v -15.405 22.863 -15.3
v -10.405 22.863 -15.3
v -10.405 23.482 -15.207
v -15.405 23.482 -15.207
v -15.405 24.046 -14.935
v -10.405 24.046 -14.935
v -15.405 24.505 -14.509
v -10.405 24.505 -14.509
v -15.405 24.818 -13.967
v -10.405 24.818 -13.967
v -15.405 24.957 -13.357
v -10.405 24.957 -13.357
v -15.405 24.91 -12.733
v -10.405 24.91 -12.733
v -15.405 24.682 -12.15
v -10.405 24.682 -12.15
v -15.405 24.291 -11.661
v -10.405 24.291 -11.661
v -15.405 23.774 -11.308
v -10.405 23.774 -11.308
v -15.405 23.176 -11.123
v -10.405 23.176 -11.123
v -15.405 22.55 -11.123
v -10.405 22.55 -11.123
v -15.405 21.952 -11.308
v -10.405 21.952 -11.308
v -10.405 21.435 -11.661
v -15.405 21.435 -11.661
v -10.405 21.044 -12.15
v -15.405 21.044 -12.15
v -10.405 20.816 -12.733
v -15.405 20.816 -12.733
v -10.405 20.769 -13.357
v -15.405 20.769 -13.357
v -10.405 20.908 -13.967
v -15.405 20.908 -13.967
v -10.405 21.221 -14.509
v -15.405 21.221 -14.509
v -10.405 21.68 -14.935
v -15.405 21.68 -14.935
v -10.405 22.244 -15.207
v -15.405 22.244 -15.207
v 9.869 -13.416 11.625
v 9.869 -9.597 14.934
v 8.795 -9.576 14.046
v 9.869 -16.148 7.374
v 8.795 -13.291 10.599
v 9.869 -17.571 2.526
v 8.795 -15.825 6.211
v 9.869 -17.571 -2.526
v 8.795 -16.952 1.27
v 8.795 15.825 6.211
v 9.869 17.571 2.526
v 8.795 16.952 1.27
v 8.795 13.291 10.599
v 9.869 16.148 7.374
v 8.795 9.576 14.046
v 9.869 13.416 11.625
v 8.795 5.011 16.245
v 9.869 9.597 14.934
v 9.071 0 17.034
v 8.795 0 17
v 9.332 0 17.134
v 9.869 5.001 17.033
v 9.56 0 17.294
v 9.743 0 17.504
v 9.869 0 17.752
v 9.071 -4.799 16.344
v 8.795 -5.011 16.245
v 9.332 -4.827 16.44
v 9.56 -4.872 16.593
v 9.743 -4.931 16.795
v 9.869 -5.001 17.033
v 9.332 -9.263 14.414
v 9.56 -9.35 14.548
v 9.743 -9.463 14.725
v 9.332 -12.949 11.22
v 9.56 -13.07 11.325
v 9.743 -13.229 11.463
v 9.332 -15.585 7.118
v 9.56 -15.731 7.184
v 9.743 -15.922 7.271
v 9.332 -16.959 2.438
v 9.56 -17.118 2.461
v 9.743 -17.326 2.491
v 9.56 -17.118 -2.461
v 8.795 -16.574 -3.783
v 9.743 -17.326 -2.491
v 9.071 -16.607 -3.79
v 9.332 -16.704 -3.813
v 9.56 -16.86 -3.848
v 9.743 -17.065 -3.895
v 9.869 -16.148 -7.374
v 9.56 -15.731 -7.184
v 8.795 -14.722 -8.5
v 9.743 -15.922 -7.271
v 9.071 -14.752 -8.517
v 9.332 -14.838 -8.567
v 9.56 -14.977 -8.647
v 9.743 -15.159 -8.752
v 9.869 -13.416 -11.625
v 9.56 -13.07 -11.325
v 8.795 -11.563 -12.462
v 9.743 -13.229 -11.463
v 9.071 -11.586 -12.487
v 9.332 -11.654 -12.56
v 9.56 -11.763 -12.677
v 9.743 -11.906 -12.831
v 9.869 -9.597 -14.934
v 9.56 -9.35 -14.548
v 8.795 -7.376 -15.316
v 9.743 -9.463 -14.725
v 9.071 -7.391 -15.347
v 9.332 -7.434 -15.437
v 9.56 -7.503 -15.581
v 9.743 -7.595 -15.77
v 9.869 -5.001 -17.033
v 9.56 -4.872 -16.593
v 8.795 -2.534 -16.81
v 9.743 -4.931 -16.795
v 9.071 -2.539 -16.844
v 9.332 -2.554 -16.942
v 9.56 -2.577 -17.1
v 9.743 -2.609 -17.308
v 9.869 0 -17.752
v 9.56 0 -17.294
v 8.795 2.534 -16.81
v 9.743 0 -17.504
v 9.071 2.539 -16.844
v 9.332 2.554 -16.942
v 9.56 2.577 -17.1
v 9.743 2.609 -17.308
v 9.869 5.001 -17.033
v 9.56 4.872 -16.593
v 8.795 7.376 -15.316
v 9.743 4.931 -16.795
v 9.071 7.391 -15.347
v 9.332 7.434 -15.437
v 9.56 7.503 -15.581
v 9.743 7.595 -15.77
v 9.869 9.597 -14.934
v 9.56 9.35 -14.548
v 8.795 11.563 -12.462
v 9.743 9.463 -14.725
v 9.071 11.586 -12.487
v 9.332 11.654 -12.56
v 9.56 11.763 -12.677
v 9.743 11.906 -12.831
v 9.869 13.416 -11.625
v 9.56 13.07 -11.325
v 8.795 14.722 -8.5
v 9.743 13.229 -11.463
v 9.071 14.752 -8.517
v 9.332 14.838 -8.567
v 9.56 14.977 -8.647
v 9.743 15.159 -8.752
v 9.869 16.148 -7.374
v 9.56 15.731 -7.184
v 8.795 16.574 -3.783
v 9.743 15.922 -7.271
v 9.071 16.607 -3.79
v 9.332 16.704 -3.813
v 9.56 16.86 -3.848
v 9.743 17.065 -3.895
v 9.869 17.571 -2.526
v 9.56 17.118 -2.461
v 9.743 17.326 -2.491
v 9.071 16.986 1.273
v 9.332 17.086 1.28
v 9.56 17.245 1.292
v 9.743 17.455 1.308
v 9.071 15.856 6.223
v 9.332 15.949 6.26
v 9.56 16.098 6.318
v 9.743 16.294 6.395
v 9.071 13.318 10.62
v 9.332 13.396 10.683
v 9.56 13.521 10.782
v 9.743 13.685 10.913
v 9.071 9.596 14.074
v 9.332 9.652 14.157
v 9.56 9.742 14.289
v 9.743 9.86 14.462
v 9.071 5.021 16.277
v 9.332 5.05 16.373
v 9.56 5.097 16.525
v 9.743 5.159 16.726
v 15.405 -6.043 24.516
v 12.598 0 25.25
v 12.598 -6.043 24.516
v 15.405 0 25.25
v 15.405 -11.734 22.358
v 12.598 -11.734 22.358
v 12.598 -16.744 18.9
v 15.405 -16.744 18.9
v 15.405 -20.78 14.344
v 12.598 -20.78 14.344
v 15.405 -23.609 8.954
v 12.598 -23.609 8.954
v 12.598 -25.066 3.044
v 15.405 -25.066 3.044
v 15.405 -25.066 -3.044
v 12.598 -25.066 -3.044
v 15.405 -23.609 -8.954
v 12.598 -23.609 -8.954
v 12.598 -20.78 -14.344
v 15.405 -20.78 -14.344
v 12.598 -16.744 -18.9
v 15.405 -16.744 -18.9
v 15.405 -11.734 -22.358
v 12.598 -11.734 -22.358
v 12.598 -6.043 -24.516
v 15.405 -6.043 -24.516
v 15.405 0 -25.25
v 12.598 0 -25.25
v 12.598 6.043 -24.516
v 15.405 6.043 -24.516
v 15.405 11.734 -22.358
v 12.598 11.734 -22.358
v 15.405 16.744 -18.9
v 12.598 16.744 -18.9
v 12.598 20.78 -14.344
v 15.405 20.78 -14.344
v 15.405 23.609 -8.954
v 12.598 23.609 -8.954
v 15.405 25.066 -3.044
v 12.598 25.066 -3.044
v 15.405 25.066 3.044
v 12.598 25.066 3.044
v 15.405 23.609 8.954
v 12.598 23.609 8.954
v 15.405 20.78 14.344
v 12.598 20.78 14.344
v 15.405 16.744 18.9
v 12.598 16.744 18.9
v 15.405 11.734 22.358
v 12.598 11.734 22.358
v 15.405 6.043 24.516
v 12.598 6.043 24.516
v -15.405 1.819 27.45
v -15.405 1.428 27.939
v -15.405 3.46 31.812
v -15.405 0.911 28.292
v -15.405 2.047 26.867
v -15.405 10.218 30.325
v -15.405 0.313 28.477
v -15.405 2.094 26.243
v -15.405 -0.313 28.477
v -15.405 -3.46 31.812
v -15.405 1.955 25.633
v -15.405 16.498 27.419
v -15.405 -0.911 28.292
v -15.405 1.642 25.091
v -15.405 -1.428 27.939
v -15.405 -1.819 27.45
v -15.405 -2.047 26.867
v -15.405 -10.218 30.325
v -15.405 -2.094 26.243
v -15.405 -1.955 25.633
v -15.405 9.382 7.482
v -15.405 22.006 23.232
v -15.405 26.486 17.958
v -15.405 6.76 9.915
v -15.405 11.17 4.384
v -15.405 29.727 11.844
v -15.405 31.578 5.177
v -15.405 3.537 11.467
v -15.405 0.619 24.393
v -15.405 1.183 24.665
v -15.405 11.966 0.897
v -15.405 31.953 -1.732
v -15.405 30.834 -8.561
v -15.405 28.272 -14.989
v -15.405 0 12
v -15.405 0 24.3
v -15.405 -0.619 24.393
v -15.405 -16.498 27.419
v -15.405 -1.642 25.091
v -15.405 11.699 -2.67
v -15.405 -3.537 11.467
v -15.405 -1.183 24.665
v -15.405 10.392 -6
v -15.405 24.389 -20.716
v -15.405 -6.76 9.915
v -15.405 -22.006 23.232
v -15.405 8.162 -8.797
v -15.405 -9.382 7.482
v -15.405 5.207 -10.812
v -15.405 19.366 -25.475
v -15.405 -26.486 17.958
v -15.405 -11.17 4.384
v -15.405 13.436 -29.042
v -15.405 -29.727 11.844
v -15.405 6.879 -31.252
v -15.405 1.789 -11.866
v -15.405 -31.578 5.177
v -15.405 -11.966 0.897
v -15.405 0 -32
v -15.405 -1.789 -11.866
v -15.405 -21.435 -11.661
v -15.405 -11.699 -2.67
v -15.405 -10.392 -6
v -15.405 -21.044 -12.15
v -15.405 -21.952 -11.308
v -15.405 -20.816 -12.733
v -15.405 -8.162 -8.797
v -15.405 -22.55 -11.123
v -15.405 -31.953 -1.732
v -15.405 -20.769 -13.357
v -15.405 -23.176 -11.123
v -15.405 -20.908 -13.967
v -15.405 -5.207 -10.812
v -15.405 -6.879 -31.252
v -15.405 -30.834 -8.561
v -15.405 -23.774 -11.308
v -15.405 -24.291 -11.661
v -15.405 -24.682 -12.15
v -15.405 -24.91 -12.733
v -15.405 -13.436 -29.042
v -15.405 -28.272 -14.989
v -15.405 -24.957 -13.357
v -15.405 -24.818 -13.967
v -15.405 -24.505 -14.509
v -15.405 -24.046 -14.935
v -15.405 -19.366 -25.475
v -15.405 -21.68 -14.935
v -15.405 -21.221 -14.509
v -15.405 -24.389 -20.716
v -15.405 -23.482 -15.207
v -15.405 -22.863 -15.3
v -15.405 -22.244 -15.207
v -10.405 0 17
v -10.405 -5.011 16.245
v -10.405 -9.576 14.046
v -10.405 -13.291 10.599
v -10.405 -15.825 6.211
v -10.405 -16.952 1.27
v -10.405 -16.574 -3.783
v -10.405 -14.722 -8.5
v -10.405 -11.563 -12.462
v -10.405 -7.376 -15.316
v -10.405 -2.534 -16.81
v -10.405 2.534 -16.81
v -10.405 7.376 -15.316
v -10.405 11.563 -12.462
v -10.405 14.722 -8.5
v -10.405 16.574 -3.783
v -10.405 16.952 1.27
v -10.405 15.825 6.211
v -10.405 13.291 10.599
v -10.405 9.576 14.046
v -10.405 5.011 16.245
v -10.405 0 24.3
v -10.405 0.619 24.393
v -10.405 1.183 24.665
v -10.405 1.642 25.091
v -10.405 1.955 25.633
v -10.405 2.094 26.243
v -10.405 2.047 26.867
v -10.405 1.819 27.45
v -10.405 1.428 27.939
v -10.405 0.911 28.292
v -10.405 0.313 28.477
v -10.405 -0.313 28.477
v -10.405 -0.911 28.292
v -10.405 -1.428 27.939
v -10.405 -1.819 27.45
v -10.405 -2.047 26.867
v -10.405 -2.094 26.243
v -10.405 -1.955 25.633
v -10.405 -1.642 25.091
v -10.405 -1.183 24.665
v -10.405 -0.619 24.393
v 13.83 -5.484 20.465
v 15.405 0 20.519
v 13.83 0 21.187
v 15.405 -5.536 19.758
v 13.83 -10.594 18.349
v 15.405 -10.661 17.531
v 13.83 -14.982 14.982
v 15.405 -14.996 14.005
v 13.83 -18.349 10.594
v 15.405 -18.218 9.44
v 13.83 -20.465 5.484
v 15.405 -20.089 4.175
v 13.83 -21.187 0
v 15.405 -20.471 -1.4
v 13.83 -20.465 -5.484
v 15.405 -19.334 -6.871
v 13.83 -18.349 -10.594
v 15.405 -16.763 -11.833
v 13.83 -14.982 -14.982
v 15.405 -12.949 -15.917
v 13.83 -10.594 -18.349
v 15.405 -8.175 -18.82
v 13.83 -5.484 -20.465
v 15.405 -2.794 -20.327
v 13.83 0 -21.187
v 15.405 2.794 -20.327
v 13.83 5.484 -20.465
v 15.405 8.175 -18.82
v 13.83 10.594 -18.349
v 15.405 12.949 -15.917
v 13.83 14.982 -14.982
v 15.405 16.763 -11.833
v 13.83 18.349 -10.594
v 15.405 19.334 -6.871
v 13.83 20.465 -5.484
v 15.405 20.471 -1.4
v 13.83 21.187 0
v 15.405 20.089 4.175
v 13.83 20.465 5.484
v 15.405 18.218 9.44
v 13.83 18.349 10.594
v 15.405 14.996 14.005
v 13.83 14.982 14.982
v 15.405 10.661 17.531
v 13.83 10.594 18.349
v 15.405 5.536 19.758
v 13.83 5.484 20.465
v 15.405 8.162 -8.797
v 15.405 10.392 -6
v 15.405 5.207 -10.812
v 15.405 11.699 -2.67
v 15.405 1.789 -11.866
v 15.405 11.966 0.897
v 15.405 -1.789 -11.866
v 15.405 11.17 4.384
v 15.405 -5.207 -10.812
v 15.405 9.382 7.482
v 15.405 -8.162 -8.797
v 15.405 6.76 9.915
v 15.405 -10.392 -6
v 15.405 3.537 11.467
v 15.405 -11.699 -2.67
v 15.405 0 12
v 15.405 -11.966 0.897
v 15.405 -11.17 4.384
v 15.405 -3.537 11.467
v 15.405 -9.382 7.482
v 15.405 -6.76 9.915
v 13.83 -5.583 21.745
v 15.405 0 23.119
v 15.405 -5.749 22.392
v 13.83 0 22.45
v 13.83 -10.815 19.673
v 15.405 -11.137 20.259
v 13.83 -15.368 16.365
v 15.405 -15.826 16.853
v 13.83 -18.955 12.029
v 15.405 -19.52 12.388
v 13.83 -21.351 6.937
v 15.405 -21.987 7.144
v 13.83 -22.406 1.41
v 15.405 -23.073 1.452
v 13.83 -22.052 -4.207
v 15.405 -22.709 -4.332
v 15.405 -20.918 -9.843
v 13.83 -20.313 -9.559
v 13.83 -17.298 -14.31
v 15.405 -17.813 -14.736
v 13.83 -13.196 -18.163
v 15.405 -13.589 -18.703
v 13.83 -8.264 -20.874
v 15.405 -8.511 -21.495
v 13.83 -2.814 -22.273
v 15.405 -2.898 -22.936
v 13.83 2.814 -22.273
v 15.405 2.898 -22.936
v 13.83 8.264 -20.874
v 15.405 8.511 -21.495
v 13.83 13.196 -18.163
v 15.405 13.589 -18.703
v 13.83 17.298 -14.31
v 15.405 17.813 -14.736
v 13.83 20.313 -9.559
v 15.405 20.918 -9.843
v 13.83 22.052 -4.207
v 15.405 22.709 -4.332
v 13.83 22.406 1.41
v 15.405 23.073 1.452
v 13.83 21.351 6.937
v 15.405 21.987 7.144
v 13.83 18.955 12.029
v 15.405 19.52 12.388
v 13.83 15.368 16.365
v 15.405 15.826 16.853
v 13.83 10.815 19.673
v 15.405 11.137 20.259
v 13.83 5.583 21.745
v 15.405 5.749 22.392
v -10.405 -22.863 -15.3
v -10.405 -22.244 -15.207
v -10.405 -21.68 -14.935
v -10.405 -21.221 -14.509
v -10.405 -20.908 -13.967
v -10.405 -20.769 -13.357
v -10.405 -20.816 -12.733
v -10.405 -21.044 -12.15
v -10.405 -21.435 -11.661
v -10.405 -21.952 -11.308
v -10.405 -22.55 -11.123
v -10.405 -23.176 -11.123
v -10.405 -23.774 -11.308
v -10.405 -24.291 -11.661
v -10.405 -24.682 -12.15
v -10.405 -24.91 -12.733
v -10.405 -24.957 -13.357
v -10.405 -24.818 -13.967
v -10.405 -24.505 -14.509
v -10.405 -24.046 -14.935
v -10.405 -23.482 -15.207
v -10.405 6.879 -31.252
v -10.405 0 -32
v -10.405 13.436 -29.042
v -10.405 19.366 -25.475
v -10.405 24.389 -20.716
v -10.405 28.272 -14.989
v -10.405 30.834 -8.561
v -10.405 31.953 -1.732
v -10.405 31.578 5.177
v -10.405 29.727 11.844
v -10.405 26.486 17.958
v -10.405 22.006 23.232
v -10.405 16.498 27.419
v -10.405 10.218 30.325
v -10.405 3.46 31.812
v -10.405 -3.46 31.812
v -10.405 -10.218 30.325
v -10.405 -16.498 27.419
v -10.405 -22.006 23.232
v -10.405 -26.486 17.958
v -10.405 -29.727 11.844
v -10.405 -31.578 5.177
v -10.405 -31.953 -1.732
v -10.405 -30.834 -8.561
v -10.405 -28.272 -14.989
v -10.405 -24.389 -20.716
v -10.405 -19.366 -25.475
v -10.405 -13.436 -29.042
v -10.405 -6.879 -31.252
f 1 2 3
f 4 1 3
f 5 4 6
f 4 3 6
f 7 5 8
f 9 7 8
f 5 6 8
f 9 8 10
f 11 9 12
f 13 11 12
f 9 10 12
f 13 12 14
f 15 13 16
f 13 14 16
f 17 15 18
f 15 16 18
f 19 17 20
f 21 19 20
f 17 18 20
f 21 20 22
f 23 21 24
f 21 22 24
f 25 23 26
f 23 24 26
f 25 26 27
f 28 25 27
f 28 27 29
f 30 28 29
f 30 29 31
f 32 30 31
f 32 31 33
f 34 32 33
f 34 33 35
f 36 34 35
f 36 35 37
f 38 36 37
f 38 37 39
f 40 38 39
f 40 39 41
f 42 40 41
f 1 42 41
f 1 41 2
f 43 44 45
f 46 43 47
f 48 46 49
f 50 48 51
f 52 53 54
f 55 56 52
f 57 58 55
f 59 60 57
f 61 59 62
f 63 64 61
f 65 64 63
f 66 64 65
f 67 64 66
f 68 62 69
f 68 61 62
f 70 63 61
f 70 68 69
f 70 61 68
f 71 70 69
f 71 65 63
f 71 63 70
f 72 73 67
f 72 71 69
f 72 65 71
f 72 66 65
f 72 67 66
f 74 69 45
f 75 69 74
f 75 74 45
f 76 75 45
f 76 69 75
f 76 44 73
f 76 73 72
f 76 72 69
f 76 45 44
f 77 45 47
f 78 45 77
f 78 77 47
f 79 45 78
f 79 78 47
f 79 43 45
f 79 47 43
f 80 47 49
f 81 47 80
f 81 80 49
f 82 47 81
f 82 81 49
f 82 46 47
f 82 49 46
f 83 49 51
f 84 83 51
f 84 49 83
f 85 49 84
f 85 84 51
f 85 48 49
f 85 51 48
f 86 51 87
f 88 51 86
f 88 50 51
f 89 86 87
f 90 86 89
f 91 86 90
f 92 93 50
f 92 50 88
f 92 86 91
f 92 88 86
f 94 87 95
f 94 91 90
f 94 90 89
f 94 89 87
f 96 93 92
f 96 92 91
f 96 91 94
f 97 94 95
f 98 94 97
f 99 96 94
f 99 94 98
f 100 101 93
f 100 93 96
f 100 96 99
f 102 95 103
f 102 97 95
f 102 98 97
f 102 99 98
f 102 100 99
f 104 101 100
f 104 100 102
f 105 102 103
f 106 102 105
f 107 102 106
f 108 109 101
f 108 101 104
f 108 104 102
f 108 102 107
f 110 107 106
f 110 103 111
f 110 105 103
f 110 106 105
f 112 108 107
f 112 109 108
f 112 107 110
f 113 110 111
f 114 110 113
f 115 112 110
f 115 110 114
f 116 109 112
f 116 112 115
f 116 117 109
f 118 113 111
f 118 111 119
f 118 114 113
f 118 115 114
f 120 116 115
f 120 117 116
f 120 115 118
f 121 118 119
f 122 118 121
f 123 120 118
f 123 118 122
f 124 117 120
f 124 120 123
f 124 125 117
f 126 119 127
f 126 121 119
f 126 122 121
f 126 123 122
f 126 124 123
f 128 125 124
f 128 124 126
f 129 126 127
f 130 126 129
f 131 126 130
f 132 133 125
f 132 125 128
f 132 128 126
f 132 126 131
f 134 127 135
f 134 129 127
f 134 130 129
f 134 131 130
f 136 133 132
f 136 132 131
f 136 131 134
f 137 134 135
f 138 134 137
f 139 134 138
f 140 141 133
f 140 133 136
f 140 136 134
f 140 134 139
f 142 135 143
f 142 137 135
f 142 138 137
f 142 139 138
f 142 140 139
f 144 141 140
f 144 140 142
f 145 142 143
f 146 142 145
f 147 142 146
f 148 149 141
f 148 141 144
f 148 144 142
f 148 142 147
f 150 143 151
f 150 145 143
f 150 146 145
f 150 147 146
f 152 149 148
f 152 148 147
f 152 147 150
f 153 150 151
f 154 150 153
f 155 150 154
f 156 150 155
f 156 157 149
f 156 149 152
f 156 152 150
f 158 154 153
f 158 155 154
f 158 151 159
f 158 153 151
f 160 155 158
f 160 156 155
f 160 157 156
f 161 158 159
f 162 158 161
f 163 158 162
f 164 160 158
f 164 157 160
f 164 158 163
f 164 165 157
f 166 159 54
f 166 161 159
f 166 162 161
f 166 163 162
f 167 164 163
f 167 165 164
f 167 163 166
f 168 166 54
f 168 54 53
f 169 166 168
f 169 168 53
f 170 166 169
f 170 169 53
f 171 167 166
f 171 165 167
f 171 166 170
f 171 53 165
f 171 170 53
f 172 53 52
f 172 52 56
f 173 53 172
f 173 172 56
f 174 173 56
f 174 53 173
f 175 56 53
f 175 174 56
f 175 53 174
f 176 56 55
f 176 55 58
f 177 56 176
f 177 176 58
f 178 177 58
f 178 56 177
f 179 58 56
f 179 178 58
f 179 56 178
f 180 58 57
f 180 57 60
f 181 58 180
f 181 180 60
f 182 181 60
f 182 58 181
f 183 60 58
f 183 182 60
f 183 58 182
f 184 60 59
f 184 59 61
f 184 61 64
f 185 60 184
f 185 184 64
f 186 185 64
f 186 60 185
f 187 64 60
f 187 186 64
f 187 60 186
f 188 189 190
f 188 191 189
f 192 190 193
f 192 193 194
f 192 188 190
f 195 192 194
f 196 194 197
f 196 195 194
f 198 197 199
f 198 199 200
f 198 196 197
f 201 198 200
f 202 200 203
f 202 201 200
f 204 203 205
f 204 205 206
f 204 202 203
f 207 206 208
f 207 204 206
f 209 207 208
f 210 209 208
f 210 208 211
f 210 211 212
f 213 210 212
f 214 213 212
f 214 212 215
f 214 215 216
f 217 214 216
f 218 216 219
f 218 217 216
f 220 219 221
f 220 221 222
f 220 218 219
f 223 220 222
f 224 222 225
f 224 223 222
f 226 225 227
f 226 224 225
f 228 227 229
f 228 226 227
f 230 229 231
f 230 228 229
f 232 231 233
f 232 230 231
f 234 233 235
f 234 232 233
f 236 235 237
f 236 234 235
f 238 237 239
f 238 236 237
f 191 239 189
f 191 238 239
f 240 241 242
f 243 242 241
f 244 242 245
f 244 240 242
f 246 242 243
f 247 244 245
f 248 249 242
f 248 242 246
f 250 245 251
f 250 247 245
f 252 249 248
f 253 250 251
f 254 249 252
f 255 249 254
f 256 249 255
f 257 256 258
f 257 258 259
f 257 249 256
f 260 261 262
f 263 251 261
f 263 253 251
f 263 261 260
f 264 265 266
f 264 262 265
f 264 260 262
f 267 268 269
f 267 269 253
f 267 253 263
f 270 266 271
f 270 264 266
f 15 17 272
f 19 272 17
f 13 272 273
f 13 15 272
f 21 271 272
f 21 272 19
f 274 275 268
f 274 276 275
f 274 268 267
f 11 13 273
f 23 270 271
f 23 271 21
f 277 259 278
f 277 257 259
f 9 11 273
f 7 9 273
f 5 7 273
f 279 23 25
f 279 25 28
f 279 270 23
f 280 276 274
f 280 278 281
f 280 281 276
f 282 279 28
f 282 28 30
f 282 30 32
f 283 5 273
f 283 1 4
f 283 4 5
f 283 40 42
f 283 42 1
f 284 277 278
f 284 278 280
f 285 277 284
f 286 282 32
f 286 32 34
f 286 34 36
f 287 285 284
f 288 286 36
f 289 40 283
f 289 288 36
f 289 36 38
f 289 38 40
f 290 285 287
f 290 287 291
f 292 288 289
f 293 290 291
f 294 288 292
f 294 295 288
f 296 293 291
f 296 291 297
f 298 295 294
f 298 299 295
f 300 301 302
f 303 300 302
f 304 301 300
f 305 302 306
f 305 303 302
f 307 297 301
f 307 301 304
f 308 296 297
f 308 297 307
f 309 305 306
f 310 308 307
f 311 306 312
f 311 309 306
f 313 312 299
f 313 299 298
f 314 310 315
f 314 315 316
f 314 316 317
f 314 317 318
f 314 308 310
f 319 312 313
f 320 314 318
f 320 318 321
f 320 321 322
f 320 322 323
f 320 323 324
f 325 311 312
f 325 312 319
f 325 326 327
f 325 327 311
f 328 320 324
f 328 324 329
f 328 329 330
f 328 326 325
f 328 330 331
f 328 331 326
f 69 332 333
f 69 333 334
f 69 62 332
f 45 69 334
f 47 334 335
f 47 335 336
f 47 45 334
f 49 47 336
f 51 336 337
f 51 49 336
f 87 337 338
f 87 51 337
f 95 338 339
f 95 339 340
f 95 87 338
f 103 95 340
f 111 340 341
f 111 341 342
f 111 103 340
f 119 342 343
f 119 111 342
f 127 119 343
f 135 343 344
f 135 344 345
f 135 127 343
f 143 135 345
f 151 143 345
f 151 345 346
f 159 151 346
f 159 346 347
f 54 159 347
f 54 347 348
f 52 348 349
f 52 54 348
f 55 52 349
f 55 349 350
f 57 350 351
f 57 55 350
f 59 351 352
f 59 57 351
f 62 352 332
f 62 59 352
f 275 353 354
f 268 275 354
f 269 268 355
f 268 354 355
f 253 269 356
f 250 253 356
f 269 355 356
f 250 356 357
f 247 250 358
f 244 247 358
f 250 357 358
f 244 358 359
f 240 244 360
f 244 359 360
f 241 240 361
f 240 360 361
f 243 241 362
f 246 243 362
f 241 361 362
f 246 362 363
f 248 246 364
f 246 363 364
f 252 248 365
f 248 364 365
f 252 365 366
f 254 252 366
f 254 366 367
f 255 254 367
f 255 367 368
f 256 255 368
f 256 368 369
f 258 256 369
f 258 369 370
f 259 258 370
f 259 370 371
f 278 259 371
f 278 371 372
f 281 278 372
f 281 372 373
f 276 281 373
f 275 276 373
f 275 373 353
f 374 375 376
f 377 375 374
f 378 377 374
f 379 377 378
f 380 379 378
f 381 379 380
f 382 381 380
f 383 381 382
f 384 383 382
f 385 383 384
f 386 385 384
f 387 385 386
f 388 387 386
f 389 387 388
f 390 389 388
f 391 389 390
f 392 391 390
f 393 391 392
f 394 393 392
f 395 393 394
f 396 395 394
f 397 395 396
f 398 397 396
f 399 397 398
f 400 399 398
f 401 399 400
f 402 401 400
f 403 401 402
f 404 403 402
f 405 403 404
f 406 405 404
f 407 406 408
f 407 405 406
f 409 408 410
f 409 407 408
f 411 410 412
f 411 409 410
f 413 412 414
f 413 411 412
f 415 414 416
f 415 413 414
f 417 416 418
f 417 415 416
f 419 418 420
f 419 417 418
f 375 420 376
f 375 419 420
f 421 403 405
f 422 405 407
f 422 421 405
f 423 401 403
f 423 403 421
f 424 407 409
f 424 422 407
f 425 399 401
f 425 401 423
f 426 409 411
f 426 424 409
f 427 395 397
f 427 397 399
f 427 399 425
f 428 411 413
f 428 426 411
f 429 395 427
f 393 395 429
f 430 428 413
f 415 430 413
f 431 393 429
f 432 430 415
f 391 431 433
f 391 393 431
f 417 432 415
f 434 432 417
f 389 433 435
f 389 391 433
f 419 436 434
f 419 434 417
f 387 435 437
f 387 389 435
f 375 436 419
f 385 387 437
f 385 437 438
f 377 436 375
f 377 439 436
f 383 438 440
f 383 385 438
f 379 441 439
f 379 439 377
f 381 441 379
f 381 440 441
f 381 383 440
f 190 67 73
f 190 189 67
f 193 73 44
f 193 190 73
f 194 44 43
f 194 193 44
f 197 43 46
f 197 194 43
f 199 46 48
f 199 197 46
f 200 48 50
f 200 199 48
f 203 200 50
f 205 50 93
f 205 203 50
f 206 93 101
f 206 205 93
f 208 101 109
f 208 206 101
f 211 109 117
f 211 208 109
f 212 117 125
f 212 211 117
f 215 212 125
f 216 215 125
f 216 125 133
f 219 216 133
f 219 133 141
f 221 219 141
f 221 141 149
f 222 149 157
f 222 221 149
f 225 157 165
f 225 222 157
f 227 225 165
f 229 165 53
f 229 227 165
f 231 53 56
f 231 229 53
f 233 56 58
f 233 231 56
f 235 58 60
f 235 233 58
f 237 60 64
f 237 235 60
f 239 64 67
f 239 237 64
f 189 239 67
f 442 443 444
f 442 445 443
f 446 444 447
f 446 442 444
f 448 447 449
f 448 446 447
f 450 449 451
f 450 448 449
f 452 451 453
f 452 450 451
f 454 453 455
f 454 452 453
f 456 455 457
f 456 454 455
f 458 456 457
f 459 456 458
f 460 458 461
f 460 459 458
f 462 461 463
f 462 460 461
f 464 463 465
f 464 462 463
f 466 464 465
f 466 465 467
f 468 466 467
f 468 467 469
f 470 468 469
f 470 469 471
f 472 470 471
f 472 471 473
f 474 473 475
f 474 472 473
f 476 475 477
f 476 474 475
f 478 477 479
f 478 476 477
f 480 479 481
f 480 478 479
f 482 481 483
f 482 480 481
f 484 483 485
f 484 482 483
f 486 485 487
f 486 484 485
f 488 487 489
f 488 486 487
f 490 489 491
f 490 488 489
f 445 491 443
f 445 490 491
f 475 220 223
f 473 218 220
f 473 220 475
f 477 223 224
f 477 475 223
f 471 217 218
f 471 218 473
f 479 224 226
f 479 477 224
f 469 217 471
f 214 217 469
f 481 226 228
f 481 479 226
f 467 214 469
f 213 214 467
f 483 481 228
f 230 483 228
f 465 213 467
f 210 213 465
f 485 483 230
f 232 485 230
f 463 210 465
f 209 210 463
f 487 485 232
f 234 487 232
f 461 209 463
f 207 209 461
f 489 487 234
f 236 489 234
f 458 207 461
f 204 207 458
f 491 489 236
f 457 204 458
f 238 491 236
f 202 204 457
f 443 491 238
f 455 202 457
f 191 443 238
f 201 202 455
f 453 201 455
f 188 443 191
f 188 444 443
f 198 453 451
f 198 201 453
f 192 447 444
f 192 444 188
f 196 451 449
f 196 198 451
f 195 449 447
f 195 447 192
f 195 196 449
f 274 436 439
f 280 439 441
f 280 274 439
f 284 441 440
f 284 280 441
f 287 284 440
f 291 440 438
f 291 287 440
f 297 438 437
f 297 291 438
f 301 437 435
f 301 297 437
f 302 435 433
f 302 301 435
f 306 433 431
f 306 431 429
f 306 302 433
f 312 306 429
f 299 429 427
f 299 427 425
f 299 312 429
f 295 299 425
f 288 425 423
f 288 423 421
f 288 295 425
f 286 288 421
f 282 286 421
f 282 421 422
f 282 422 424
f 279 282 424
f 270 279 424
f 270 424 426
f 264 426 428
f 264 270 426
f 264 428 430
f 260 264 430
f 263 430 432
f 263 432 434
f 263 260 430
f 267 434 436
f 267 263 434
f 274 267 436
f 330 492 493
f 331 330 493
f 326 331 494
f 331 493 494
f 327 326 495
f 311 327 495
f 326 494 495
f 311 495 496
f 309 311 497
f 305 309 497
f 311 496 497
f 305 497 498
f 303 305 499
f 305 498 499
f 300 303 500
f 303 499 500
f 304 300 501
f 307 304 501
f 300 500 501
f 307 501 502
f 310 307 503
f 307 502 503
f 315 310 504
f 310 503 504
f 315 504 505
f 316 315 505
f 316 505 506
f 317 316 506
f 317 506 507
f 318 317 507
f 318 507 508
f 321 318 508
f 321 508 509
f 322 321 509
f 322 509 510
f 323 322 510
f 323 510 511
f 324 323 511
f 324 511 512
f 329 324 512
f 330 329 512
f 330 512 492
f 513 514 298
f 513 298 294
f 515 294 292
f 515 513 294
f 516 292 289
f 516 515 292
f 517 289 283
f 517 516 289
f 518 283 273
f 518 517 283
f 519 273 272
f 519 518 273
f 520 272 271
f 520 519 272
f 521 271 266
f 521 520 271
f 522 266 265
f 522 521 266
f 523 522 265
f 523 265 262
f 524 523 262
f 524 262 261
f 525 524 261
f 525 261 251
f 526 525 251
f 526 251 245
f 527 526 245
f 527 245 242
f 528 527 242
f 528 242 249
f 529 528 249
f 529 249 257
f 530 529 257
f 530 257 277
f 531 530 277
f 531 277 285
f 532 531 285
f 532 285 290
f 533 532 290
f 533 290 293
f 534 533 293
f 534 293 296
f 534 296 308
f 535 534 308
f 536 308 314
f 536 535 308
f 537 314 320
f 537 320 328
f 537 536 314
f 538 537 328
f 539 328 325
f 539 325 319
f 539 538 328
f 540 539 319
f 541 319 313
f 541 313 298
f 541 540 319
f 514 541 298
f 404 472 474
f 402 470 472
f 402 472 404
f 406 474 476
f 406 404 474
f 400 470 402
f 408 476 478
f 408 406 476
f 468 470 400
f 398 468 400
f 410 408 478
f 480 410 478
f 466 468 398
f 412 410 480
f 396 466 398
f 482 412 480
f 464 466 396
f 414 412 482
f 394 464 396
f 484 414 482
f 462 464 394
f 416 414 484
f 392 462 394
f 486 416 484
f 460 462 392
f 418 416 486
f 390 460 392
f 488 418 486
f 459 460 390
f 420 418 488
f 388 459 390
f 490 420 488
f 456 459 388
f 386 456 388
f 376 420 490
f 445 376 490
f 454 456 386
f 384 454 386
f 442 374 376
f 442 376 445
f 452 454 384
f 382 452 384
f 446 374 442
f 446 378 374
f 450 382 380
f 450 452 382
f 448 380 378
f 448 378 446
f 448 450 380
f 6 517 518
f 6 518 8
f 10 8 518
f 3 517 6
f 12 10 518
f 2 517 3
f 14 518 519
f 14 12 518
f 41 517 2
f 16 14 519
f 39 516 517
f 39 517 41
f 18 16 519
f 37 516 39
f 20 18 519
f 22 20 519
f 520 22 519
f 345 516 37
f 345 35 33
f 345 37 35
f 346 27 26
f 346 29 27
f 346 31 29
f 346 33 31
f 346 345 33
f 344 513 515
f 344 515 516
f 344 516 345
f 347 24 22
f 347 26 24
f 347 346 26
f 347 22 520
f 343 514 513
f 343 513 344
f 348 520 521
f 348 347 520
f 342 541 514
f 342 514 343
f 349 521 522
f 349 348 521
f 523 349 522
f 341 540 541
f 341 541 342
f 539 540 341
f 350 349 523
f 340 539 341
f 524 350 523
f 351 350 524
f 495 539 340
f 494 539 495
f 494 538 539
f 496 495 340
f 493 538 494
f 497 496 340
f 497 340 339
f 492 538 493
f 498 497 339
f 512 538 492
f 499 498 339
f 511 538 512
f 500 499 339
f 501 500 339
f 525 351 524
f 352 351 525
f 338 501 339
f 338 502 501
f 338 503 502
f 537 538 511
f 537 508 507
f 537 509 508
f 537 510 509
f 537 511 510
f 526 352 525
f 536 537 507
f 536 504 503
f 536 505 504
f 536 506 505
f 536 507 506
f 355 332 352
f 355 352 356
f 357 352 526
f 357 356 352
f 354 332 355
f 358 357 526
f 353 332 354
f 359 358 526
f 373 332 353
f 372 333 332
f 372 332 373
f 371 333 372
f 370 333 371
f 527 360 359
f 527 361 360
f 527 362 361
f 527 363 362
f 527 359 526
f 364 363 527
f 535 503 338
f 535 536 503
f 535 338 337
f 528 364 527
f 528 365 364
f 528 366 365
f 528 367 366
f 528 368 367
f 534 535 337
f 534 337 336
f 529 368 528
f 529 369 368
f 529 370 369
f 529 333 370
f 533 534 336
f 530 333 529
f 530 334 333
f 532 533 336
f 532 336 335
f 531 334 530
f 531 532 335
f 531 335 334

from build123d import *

# Parameters (mm, degrees)
M5_TAPPED_HOLE1_D       = 4.2
M5_TAPPED_HOLE1_DEPTH   = 12.4
M5_TAPPED_HOLE1_TIP     = 1.2618073
SKETCH5_R               = 42
SKETCH5_R_2             = 32
CUT_EXTRUDE_THIN1_DEPTH = 55.572226802


with BuildPart() as part:
    # Sketch1 → Revolve1 (revolve)
    with BuildSketch(Plane.XY):
        with BuildLine():
            Line((-15.404727216, 12), (-15.404727216, 34))
            Line((-15.404727216, 34), (-10.404727216, 34))
            Line((-10.404727216, 34), (-10.404727216, 17))
            Line((-10.404727216, 17), (8.794935567, 17))
            ThreePointArc((8.794935567, 17), (9.450533434, 17.206709213), (9.869004233, 17.752070976))
            Line((9.869004233, 17.752070976), (12.598027216, 25.25))
            Line((12.598027216, 25.25), (15.404727216, 25.25))
            Line((15.404727216, 25.25), (15.404727216, 23.1186))
            Line((15.404727216, 23.1186), (13.829927216, 22.450137059))
            Line((13.829927216, 22.450137059), (13.829927216, 21.187062941))
            Line((13.829927216, 21.187062941), (15.404727216, 20.5186))
            Line((15.404727216, 20.5186), (15.404727216, 12))
            Line((15.404727216, 12), (-15.404727216, 12))
        make_face()
    revolve(axis=Axis((0, 0, 0), (1, 0, 0)))

    # M5 Tapped Hole1
    with Locations(Plane.ZY.offset(15.404727216)):
        with Locations((-13.199999999, -22.86307066), (-13.200000001, 22.863070659), (26.4, 1e-09)):
            Hole(M5_TAPPED_HOLE1_D / 2, depth=M5_TAPPED_HOLE1_DEPTH)
            with Locations((0, 0, -(M5_TAPPED_HOLE1_DEPTH + M5_TAPPED_HOLE1_TIP / 2))):  # 118° drill point
                Cone(0, M5_TAPPED_HOLE1_D / 2, M5_TAPPED_HOLE1_TIP, mode=Mode.SUBTRACT)

    # Sketch5 → Cut-Extrude-Thin1 (cut, through all)
    with BuildSketch(Plane(origin=(-10.404727216, 0, 0), x_dir=(0, 0, -1), z_dir=(1, 0, 0))):
        Circle(SKETCH5_R)
        Circle(SKETCH5_R_2, mode=Mode.SUBTRACT)
    extrude(amount=-CUT_EXTRUDE_THIN1_DEPTH, mode=Mode.SUBTRACT)


solid = part.part
